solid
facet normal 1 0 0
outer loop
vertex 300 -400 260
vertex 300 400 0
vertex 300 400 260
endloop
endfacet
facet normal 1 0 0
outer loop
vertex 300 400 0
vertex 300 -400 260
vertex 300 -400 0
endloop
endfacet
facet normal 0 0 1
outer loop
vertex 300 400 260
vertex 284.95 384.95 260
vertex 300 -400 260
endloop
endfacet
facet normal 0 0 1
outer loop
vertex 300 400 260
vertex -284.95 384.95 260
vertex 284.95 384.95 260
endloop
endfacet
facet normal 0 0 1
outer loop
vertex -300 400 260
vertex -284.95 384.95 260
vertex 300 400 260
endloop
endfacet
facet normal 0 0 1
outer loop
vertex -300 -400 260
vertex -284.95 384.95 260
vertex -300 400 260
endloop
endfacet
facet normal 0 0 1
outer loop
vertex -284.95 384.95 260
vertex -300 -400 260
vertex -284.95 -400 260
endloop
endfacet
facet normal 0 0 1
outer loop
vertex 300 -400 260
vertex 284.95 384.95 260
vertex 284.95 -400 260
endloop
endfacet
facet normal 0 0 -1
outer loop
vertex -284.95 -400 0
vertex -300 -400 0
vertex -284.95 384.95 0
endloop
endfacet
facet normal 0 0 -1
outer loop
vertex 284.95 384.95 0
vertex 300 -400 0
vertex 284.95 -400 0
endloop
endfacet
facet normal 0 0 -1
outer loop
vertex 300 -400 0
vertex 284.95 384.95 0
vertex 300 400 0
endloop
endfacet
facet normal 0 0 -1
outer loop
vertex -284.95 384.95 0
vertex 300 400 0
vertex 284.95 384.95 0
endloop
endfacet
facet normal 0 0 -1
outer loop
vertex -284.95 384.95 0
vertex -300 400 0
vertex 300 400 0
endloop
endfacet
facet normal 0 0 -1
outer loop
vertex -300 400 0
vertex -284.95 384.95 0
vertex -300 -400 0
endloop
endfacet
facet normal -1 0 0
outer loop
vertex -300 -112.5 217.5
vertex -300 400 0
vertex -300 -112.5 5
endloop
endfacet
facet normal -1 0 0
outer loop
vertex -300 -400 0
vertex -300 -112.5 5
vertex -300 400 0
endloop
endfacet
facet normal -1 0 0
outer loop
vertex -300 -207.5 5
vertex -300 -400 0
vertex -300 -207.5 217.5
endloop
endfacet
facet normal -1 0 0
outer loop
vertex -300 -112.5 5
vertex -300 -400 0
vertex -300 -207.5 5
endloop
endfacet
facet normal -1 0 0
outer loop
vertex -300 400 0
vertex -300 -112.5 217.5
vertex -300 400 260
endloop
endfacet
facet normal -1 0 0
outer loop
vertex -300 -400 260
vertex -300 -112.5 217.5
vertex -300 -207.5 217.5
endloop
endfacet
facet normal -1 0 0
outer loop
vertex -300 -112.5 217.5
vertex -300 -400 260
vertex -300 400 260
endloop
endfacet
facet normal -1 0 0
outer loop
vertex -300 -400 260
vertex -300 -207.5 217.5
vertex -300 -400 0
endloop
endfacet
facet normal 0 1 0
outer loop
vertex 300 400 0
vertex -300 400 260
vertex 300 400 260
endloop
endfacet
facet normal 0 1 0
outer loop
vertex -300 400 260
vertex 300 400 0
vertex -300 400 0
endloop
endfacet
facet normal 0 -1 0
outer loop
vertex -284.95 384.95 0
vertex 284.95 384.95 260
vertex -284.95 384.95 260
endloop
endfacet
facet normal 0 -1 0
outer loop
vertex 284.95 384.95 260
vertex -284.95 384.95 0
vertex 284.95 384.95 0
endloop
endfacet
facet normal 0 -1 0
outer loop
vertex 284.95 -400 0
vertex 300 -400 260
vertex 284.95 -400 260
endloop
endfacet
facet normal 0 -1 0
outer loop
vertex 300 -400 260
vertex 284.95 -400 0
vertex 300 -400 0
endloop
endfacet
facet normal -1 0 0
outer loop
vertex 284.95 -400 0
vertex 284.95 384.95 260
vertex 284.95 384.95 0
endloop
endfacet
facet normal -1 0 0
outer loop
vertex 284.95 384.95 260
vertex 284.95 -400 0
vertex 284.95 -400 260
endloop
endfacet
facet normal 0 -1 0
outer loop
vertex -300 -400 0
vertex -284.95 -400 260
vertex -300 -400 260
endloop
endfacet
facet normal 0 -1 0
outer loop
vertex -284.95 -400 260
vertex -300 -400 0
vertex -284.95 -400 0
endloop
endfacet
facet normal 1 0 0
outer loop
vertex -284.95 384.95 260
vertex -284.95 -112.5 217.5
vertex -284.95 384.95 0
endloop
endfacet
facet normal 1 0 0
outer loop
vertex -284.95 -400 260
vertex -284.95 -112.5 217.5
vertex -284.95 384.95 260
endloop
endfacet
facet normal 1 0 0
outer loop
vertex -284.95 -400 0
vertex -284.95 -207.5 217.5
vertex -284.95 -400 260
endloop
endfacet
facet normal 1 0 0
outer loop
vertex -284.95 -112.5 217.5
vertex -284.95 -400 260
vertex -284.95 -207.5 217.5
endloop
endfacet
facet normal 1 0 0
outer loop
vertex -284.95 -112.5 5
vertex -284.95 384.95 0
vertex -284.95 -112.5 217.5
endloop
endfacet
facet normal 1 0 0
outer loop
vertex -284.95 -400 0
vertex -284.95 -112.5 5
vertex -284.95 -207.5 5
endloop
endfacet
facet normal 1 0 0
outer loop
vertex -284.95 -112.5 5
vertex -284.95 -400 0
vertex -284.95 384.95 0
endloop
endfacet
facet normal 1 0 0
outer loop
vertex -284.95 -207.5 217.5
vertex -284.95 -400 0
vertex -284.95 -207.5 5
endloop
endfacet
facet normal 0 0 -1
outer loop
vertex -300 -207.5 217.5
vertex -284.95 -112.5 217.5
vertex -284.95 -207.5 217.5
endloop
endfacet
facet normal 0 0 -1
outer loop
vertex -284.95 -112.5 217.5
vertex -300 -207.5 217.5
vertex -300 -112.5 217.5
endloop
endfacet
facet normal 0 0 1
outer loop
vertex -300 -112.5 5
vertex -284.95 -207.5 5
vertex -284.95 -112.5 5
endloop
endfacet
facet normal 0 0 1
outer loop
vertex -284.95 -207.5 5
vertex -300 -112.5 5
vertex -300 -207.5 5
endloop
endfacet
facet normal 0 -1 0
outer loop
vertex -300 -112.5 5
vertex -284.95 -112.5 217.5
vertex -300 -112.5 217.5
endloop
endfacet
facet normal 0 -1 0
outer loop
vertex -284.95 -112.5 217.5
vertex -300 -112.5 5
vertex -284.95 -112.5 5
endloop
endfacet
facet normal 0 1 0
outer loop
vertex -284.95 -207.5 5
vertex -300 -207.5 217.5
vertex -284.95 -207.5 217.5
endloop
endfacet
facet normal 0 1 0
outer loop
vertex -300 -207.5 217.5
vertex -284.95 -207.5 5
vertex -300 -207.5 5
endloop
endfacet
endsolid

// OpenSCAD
// file: kitchenwalls.scad
module kitchenwalls(width=250, length=200, wall_thickness=15, wall_height=260,wall_color=[255/255, 255/255, 255/255],wall_alpha=1.0, paint_the_room = [0.9, 0.3,0.9])
{
    // Door opening size. Then we need some extra space for the door frame.
    door_width = 90+5;
    door_height = 210+2.5;
    
    // Position the door so that bottom of opening is 5 cm above floor level
    door_y_pos = (wall_height-door_height)/2 - 5;
        
    // Position the door horizontally off the center.
    door_x_pos = -width/5;
    side_door_x_pos = -width/10;
    
    // Rise the part of floor which should stay dry by 2.5 cm.
    rise_floor = 2.5;
    rised_width = width/2;
    
    // Rise walk in floor more to allow sitting to toilet seat with dry feet by 2.0 cm for 100 cm
    double_rise_floor = 2.0;
    double_rised_length = 100;
    
    // Hole size, 8 cm
    hole_size = 8;

    /* difference() {
        union() {
            translate([0,-width/2+wall_thickness/2, wall_height/2]) 
            color(wall_color,wall_alpha) 
            cube([length, wall_thickness, wall_height],center=true);
            
            translate([0,-width/2+wall_thickness, wall_height/2]) 
            color(paint_the_room,wall_alpha) 
            cube([length, 0.1, wall_height],center=true);
        }
    
        // Door 
            color(wall_color,wall_alpha) 
            translate([side_door_x_pos,-width/2+wall_thickness/2, wall_height/2-door_y_pos]) cube([door_width, wall_thickness+1, door_height],center=true);
    } */

    difference() {
        union() {
            translate([0,width/2-wall_thickness/2, wall_height/2]) color(wall_color,wall_alpha) cube([length,  wall_thickness, wall_height],center=true);
            translate([0,width/2-wall_thickness, wall_height/2]) color(paint_the_room,wall_alpha) cube([length,  0.1, wall_height],center=true);
        }
    }
    
    difference() {
        union() {
            translate([length/2-wall_thickness/2, 0, wall_height/2]) color(wall_color,wall_alpha) cube([wall_thickness, width, wall_height],center=true);
            translate([length/2-wall_thickness, 0, wall_height/2]) color(paint_the_room,wall_alpha) cube([0.1, width, wall_height],center=true);
        }
    }     

    difference() {
        union() {
            translate([-length/2+wall_thickness/2, 0, wall_height/2]) color(wall_color,wall_alpha) cube([wall_thickness, width, wall_height],center=true);
            translate([-length/2+wall_thickness, 0, wall_height/2])  color(paint_the_room,wall_alpha) cube([0.1, width, wall_height],center=true);
        }

        // Door
        translate([-length/2+wall_thickness/2, door_x_pos, wall_height/2-door_y_pos])
            color(wall_color,wall_alpha)
            cube([wall_thickness+1, door_width, door_height],center=true);
    }
}

// For testing
kitchenwalls();
// main file
use <kitchenwalls.scad>

module kitchen(width=800, length=600, wall_thickness=15, wall_height=260,wall_color=[255/255, 255/255, 255/255],wall_alpha=1.0, paint_the_room = [0.9, 0.3,0.9]) 
{
    kitchenwalls(width, length, wall_thickness, wall_height, wall_color, wall_alpha, paint_the_room);
}

/* For testing */
kitchen();
